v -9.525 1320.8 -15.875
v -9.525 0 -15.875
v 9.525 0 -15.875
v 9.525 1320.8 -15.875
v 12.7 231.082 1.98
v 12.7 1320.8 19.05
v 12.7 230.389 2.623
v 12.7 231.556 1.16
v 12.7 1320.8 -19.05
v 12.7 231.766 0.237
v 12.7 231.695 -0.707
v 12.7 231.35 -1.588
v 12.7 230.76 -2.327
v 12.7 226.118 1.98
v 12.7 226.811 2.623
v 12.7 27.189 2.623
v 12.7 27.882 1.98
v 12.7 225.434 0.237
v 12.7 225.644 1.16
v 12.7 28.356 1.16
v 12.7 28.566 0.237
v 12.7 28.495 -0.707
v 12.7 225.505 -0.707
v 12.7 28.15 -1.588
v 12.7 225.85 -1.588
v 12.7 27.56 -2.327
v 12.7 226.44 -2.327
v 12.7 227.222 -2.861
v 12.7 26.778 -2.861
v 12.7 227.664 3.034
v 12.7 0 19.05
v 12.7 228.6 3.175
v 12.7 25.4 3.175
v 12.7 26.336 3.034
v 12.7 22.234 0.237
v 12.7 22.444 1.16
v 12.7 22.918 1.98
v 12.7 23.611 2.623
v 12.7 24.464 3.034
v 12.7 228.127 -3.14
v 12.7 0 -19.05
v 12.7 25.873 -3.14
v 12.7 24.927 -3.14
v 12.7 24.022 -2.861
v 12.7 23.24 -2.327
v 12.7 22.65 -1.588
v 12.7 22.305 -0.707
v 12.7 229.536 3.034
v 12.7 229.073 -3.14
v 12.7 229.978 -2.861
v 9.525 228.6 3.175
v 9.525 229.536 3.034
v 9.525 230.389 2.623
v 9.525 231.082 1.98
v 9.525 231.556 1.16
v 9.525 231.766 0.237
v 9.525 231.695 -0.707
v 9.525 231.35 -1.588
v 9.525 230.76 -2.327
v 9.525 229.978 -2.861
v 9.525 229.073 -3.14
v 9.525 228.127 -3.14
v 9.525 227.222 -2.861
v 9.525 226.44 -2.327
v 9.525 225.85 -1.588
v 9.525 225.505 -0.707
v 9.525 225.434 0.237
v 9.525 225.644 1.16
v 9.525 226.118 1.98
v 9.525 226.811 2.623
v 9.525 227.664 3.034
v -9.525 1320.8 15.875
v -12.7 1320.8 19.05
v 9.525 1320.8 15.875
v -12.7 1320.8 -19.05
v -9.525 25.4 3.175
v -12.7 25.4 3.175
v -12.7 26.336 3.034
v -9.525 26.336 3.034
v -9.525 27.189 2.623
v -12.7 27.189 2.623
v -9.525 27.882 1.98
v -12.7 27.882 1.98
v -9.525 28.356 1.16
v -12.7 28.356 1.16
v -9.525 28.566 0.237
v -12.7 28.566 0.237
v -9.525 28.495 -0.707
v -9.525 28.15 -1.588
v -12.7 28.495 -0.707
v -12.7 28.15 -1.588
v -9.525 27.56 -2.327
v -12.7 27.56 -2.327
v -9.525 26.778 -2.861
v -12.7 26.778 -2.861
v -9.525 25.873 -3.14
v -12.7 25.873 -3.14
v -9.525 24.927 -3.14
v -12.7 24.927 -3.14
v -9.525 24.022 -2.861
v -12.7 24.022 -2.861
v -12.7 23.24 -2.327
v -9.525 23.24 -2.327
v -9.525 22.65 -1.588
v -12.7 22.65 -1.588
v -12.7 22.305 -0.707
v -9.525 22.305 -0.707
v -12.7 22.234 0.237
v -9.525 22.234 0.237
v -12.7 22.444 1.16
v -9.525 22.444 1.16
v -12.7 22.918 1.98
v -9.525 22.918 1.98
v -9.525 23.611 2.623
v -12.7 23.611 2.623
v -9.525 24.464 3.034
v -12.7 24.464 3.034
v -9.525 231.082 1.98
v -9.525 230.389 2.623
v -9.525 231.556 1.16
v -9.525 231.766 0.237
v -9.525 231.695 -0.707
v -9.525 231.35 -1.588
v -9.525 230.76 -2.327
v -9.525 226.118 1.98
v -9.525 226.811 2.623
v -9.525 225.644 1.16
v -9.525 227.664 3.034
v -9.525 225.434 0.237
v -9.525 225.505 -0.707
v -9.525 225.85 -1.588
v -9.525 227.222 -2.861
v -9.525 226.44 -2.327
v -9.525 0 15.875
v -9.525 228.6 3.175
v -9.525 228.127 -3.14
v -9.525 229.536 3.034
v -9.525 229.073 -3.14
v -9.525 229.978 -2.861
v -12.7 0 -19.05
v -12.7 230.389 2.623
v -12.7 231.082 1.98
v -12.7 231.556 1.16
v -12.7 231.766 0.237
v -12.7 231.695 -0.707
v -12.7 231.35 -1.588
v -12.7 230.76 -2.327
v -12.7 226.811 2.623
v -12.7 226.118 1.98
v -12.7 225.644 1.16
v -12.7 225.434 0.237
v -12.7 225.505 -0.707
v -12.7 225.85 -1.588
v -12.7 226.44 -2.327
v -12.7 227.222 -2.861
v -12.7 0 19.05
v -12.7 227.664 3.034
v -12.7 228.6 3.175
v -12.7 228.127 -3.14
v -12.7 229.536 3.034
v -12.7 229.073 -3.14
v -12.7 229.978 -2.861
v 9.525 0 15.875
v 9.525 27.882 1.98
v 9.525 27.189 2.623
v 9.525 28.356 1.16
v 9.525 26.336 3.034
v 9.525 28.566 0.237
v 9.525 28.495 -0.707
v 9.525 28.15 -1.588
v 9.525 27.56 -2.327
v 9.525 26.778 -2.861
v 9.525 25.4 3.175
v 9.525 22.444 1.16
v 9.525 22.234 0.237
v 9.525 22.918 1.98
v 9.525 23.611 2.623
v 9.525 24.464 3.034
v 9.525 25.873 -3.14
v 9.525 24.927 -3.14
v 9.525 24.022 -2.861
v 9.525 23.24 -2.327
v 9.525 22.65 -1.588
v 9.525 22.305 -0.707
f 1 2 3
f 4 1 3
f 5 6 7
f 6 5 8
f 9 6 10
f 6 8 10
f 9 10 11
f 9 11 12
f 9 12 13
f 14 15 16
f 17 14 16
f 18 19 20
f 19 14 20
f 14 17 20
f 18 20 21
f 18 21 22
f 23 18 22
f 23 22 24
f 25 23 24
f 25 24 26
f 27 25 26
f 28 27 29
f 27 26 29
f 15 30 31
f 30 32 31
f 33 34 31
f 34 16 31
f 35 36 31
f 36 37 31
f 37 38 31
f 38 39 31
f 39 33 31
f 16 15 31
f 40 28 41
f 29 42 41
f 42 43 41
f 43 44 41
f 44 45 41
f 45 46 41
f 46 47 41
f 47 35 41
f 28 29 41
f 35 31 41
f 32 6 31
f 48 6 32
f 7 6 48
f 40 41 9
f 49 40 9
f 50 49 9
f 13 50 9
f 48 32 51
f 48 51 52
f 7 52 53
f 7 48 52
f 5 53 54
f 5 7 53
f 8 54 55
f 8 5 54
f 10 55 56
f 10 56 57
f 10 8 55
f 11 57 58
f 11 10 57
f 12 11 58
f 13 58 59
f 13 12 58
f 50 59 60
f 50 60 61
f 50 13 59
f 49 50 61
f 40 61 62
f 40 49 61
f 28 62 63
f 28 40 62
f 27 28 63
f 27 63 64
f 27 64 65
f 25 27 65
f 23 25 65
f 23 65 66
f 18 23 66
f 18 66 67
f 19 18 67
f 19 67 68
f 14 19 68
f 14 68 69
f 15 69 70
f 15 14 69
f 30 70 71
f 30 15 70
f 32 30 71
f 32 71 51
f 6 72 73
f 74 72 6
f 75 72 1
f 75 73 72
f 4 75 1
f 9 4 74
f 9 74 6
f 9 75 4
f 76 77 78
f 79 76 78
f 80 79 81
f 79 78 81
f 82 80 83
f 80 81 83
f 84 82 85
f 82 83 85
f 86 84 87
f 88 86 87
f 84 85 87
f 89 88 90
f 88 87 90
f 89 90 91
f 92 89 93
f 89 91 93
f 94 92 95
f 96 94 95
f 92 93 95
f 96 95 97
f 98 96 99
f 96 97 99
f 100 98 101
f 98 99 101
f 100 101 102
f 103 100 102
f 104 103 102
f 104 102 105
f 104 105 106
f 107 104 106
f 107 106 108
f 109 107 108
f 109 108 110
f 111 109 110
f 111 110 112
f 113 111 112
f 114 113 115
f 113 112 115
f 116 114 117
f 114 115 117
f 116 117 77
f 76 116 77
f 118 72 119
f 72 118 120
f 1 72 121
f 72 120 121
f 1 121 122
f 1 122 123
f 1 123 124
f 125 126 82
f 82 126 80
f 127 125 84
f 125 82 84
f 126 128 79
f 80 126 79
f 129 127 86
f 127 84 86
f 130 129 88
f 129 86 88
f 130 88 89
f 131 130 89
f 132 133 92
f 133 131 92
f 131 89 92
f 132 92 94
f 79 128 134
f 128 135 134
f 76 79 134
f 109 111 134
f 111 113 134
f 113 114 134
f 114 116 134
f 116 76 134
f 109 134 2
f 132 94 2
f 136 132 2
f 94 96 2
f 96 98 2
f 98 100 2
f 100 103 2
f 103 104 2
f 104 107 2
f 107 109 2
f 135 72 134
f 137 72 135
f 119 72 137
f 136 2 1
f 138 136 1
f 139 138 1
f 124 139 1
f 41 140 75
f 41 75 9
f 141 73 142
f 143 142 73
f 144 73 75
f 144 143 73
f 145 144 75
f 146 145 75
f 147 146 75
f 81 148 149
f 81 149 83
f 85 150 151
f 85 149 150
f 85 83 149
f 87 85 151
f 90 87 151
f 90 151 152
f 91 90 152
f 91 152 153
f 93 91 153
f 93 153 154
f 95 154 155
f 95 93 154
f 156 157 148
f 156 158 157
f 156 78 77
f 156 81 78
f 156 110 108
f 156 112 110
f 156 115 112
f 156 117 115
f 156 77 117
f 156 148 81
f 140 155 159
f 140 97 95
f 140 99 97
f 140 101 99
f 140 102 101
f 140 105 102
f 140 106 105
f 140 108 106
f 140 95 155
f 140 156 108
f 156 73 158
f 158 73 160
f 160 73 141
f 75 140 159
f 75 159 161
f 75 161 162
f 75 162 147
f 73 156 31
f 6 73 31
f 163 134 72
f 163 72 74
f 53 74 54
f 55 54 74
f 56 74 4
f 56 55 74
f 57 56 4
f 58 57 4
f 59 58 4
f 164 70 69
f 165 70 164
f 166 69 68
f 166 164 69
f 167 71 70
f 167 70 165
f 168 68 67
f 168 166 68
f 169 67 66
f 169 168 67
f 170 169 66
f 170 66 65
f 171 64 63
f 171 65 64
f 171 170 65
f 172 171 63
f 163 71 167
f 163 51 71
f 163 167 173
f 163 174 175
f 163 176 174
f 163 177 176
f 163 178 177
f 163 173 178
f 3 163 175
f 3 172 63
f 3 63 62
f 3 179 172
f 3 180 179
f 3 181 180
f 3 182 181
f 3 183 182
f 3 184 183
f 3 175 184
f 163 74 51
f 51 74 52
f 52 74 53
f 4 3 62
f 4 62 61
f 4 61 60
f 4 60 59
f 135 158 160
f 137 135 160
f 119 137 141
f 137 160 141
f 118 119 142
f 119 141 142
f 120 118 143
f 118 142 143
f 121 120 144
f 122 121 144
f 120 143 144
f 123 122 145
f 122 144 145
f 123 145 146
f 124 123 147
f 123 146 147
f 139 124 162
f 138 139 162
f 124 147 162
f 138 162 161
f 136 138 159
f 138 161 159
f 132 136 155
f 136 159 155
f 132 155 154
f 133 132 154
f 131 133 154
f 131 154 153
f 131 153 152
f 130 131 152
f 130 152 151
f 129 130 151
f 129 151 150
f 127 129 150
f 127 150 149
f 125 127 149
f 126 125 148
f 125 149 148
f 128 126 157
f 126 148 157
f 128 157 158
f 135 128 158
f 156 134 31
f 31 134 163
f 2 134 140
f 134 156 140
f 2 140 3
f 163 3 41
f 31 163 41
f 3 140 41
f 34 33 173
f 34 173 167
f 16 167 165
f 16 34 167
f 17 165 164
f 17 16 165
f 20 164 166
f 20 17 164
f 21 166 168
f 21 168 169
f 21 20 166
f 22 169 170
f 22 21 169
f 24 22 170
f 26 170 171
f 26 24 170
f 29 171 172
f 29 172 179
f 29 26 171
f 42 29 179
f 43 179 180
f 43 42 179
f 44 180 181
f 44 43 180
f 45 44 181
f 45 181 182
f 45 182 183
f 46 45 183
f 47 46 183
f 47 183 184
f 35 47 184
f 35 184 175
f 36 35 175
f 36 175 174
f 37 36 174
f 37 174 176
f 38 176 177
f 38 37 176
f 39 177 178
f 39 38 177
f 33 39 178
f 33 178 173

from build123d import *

# Parameters (mm, degrees)
SKETCH1_W           = 25.4
SKETCH1_H           = 38.1
SKETCH1_W_2         = 19.05
SKETCH1_H_2         = 31.75
BOSS_EXTRUDE1_DEPTH = 1320.8
SKETCH2_R           = 3.175
CUT_EXTRUDE1_DEPTH  = 3.175


with BuildPart() as part:
    # Sketch1 → Boss-Extrude1 (new body)
    with BuildSketch(Plane(origin=(0, 0, 0), x_dir=(1, 0, 0), z_dir=(0, 1, 0))):
        Rectangle(SKETCH1_W, SKETCH1_H)
        Rectangle(SKETCH1_W_2, SKETCH1_H_2, mode=Mode.SUBTRACT)
    extrude(amount=BOSS_EXTRUDE1_DEPTH)

    # Sketch2 → Cut-Extrude1 (cut)
    with BuildSketch(Plane.ZY.offset(12.7)):
        with Locations((0, 25.4)):
            Circle(SKETCH2_R)
        with Locations((0, 228.6)):
            Circle(SKETCH2_R)
    cut_extrude1 = extrude(amount=-CUT_EXTRUDE1_DEPTH, mode=Mode.SUBTRACT)

    # Mirror1: Cut-Extrude1 across plane
    add(cut_extrude1.mirror(Plane(origin=(0, 0, 0), x_dir=(0, 0, 1), z_dir=(1, 0, 0))), mode=Mode.SUBTRACT)


solid = part.part
